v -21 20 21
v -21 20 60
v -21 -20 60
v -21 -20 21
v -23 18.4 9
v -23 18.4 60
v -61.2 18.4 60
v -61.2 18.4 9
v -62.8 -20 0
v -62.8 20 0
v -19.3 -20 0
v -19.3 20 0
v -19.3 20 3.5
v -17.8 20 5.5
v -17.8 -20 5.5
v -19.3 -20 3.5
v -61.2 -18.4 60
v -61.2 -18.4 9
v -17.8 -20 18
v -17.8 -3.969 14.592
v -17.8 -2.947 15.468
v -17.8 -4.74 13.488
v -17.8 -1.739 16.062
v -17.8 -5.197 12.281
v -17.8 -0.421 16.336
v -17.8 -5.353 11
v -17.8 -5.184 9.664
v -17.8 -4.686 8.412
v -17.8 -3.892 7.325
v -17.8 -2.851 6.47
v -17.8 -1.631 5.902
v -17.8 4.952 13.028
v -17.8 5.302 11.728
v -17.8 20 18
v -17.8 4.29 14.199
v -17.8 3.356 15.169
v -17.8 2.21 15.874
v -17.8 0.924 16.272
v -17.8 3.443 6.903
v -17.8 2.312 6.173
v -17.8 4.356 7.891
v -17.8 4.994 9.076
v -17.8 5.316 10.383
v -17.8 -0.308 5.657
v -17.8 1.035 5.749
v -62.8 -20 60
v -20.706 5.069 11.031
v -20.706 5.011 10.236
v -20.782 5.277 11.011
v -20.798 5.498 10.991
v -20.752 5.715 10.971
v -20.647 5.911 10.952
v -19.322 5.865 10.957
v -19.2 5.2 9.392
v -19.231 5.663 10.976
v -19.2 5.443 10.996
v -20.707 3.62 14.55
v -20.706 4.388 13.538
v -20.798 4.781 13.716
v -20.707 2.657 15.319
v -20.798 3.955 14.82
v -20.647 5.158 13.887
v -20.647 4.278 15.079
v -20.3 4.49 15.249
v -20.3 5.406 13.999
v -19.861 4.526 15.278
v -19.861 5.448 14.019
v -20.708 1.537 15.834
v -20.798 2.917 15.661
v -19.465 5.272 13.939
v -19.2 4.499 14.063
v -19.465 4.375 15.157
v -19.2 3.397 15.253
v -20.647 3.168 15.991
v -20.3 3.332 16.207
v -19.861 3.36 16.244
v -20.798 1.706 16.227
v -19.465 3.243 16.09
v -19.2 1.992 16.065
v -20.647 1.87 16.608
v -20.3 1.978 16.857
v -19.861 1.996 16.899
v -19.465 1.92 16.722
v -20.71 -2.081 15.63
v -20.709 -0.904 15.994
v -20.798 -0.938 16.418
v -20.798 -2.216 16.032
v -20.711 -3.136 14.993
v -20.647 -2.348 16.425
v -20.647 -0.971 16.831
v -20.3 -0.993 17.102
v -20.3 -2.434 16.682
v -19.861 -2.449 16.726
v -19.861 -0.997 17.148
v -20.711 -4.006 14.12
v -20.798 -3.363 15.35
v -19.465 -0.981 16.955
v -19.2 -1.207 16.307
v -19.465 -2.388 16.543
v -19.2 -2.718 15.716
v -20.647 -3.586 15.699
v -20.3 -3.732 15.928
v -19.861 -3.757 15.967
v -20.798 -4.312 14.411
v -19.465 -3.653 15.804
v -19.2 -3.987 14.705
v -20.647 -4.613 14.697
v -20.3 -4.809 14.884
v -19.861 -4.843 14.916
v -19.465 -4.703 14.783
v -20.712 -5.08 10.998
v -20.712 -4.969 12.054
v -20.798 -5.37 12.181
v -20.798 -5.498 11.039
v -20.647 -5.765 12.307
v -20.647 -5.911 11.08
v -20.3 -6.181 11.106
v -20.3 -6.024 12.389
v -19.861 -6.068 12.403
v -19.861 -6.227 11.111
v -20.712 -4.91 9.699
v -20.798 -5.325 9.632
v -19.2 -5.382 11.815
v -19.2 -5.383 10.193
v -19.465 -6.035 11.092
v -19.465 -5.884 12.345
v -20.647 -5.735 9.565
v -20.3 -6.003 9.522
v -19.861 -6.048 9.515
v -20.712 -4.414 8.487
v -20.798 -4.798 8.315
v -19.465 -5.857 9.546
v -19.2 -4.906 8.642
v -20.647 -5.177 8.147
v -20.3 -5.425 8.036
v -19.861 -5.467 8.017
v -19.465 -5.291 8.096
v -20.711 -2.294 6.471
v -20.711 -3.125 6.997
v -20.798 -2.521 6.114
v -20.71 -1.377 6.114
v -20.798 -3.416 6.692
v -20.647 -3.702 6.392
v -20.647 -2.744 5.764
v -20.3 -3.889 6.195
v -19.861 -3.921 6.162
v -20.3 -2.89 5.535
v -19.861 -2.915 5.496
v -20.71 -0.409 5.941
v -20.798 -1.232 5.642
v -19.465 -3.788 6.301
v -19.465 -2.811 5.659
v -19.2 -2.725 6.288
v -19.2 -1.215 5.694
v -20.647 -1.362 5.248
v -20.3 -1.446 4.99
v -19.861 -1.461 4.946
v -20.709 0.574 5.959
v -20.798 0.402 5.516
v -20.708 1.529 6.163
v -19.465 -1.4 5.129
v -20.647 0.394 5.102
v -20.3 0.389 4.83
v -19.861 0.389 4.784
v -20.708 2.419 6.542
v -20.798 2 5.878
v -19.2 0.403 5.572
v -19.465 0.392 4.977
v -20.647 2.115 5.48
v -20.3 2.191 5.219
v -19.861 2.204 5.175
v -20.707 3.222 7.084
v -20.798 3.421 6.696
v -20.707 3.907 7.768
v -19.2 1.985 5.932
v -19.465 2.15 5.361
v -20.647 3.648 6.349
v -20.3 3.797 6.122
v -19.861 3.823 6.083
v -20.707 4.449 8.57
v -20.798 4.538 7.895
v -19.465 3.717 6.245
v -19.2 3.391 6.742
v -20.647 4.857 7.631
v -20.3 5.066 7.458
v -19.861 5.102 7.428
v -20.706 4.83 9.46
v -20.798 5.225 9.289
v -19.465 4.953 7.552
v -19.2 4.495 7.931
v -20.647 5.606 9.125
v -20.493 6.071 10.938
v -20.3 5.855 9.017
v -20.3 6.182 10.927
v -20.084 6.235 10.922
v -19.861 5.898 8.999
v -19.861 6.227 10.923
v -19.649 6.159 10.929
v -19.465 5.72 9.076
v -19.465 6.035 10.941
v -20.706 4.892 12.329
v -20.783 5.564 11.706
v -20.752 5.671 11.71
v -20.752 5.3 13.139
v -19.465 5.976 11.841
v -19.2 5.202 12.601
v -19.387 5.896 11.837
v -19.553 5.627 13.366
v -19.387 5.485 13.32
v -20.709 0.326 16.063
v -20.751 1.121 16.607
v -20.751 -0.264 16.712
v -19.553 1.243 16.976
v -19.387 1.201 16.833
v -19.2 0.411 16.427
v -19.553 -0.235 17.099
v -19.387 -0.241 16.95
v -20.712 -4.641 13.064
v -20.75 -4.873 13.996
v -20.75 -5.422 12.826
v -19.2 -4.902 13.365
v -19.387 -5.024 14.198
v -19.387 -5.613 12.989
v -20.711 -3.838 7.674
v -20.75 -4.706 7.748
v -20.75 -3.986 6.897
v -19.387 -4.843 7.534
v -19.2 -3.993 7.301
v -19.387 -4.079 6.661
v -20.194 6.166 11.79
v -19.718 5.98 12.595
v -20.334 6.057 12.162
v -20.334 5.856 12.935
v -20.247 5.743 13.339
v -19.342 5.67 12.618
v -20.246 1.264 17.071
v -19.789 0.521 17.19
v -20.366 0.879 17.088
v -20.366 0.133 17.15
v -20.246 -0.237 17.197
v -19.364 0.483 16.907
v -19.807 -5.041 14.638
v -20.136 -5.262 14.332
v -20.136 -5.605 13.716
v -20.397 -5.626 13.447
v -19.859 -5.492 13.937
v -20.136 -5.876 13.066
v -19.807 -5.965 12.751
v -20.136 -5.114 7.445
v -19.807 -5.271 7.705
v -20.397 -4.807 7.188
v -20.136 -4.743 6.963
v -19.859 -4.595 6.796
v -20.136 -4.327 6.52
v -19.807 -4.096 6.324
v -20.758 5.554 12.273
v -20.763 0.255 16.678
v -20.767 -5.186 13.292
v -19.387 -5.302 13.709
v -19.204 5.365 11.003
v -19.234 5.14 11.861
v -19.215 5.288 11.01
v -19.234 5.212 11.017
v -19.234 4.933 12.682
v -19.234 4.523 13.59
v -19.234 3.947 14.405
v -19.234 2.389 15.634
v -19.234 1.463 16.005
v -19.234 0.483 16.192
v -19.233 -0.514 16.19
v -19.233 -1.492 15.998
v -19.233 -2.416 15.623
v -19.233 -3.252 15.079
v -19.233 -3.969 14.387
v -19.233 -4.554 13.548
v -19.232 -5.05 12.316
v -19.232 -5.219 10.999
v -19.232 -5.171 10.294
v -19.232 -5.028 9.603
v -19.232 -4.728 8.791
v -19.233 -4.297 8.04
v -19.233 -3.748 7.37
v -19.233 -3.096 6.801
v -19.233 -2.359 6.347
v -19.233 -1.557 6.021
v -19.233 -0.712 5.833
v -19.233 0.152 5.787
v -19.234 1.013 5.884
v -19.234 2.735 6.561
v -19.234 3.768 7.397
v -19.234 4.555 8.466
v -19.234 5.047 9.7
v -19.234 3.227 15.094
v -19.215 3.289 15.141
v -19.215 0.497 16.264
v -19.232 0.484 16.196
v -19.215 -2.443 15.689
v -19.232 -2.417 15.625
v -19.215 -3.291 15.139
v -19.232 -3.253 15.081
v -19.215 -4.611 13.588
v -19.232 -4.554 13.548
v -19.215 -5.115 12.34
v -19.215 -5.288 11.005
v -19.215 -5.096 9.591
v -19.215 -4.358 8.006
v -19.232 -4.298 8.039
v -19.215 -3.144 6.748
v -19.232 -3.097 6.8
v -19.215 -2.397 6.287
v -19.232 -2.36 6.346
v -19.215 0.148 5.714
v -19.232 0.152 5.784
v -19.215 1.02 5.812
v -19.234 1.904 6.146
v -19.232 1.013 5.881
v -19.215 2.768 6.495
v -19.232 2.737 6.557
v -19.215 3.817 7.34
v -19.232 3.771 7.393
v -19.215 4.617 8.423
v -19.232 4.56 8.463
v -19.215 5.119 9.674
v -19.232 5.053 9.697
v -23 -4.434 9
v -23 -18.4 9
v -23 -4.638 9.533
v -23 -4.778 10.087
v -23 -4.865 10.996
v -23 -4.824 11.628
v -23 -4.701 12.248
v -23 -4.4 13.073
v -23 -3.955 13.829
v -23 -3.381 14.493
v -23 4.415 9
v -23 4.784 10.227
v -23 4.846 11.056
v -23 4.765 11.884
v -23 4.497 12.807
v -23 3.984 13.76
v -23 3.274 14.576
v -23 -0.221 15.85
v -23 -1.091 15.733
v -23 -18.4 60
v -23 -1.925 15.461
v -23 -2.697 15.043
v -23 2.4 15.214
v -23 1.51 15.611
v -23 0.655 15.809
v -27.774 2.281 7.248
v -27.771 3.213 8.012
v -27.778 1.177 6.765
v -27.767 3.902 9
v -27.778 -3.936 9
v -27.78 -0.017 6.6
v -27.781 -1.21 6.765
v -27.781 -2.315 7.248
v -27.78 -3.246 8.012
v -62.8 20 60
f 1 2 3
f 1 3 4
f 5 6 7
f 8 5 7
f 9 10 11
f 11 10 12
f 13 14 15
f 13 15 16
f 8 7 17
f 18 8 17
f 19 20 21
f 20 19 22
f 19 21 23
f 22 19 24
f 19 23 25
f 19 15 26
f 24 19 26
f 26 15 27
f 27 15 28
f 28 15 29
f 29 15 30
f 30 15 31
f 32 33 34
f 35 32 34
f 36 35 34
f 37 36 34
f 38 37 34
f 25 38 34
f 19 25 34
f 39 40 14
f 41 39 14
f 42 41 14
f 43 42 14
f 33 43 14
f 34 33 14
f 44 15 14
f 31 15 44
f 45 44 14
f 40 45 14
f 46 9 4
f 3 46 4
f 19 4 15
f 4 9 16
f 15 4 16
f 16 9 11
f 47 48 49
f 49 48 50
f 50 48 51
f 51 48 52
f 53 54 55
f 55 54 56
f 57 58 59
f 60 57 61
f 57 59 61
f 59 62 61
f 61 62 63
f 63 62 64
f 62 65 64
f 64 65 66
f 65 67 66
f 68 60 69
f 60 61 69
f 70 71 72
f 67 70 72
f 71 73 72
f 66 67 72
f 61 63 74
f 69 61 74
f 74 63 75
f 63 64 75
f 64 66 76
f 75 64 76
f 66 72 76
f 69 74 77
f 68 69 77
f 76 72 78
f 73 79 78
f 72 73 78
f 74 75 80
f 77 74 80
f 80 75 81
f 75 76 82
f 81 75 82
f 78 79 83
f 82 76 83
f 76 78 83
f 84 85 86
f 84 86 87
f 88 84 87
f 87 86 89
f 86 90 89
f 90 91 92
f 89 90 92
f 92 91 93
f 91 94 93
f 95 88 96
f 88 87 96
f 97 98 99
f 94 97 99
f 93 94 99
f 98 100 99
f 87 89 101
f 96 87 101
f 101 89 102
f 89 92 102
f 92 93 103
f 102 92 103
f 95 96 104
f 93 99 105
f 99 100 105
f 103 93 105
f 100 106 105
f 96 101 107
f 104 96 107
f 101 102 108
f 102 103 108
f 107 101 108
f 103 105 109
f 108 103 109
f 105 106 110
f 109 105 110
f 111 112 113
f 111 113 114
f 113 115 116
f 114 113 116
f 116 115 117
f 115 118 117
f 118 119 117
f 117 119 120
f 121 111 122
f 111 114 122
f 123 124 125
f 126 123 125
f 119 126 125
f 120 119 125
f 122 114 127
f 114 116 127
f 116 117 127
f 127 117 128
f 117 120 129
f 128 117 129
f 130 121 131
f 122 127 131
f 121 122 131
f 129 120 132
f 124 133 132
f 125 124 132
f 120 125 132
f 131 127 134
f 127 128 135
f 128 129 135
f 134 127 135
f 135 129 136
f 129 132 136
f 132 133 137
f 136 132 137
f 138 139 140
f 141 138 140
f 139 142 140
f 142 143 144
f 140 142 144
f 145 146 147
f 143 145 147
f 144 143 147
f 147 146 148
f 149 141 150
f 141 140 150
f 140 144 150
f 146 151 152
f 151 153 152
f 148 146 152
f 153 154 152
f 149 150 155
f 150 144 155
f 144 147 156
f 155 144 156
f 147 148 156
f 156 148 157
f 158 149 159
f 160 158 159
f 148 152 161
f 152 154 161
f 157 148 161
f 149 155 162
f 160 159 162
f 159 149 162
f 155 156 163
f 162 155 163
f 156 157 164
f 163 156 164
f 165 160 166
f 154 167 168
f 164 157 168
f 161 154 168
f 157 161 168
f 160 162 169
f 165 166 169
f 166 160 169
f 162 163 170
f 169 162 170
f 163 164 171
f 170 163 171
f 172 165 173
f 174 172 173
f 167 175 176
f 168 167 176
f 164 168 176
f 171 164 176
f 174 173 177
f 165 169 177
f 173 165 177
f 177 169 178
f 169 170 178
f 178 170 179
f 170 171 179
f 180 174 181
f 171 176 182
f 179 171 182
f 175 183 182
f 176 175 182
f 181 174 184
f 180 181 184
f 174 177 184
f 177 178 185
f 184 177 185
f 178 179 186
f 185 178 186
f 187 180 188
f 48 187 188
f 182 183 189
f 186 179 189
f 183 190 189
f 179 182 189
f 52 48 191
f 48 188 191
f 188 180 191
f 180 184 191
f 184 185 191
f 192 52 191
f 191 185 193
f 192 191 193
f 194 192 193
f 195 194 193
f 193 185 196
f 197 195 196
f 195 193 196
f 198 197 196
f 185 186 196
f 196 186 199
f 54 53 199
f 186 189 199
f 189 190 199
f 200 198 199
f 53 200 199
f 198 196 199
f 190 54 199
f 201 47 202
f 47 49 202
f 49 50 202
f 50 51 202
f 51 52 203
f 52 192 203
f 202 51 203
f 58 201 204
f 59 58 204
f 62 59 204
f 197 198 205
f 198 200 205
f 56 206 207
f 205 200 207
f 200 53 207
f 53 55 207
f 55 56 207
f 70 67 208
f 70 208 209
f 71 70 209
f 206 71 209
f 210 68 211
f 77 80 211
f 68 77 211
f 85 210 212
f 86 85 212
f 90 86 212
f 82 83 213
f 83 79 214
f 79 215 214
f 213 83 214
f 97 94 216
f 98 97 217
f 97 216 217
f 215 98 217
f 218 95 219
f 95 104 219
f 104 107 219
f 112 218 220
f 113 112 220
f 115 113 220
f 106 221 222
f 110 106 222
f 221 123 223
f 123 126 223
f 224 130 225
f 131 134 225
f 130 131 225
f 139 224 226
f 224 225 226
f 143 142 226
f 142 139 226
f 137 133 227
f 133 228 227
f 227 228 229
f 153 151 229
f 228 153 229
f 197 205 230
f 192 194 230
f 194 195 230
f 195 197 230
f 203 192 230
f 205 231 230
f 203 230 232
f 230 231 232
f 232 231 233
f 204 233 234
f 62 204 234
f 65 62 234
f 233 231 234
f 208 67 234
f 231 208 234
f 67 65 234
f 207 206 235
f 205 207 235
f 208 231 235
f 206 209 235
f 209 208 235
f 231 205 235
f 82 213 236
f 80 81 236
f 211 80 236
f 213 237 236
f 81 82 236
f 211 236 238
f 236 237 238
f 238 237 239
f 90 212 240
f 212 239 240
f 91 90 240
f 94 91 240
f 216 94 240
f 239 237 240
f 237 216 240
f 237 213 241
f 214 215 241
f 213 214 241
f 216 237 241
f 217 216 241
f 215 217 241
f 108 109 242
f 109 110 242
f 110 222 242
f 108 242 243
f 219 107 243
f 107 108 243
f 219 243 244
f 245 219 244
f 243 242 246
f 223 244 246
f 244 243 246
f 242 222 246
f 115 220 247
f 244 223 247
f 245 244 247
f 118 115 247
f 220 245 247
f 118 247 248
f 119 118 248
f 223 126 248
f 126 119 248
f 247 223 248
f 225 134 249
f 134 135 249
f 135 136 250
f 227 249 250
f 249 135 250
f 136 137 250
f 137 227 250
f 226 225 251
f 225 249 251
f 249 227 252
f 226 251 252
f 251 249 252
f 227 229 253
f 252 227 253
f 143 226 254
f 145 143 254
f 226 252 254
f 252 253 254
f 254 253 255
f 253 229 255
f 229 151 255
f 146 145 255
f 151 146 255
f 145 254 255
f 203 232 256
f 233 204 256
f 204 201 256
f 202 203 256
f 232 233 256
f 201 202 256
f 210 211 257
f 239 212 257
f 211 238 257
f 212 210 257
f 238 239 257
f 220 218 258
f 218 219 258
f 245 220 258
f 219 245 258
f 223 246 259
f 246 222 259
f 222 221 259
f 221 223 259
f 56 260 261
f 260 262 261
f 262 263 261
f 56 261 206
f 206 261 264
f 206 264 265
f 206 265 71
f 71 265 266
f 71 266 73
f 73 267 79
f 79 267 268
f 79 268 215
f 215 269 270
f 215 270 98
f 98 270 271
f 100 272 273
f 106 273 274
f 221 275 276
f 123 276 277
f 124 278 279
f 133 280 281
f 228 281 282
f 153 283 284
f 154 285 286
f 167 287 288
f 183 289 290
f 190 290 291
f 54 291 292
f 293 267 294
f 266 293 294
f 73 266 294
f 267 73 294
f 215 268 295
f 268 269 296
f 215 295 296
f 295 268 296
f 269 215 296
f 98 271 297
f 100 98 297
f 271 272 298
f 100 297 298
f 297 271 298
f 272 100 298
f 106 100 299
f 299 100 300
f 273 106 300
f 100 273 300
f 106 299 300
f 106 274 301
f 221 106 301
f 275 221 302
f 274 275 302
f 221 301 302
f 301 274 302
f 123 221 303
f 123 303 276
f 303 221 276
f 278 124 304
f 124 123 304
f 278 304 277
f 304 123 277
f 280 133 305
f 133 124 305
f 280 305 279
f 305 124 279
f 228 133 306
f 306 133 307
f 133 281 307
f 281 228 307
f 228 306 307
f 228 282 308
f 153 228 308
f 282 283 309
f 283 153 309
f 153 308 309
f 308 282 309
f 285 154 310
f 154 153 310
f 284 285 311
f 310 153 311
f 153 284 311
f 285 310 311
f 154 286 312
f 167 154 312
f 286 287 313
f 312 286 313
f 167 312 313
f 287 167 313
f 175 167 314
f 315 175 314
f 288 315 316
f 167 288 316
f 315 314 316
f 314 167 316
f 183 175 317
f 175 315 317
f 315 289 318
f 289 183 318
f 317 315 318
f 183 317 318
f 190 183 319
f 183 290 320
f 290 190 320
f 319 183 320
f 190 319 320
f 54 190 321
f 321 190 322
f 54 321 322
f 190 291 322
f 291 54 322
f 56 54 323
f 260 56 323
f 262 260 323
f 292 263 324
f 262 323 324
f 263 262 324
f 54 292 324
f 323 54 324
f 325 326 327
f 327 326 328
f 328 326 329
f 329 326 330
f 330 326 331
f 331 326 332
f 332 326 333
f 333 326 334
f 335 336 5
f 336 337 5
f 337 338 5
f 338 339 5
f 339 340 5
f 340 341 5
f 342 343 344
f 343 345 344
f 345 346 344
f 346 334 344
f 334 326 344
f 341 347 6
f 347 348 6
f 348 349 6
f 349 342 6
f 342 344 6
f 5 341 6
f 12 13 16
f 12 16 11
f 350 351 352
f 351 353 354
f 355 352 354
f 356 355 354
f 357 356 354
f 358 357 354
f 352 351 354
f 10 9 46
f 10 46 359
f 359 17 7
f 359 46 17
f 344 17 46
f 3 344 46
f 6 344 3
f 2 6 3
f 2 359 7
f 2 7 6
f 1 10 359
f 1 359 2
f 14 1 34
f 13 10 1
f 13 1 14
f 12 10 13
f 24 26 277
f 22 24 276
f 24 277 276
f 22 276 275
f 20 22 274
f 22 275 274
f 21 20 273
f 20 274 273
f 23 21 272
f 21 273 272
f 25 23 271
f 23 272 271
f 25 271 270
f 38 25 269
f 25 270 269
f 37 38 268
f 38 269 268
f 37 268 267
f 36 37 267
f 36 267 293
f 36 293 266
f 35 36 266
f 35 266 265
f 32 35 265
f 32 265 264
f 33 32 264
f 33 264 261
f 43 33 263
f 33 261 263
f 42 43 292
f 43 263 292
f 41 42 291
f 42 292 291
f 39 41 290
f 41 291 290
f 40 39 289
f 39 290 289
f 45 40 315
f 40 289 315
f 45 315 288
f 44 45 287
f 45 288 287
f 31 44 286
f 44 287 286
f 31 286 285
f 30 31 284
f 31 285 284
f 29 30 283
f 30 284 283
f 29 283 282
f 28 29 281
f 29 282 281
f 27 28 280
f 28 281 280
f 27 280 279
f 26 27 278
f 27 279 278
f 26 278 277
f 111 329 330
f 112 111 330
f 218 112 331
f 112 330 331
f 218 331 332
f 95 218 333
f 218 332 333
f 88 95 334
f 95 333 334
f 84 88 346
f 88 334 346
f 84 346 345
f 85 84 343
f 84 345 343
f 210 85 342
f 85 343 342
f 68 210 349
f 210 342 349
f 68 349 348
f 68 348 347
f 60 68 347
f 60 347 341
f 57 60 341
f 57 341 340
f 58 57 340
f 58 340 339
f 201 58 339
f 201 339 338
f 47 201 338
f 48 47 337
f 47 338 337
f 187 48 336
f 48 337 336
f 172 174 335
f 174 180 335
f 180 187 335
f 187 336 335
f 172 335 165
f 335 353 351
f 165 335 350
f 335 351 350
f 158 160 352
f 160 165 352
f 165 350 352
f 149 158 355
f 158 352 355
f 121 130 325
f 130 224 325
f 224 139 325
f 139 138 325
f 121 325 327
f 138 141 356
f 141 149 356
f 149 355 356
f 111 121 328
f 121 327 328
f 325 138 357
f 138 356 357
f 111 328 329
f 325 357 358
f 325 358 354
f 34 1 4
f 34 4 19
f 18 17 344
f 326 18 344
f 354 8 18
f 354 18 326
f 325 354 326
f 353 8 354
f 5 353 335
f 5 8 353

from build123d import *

# Parameters (mm, degrees)
SKETCH010_W  = 45
SKETCH010_H  = 40
PAD005_DEPTH = 60
SKETCH012_W  = 38.2
SKETCH012_H  = 36.8
SKETCH003_R  = 5.4
SKETCH011_R  = 4.4
SKETCH046_R  = 0.8


with BuildPart() as part:
    # Sketch010 → Pad005 (new body)
    with BuildSketch(Plane.XY):
        with Locations((-40.3, 0)):
            Rectangle(SKETCH010_W, SKETCH010_H)
    extrude(amount=PAD005_DEPTH)

    # SubtractivePipe002: sweep along a path in Sketch028
    with BuildLine(Plane.XZ) as subtractivepipe002_path:
        Line((-39, 9), (-39, 60))
    # Sketch012 → SubtractivePipe002 (sweep, cut)
    with BuildSketch(Plane.XY.offset(9)):
        with Locations((-42.1, 0)):
            Rectangle(SKETCH012_W, SKETCH012_H)
    sweep(path=subtractivepipe002_path.line, mode=Mode.SUBTRACT)

    # Sketch003 (on Face10 of SubtractivePipe) → SubtractiveLoft section 0
    with BuildSketch(Plane(origin=(-17.3, 0, 0), x_dir=(0, -1, 0), z_dir=(-1, 0, 0))):
        with Locations((0, 11)):
            Circle(SKETCH003_R)
    # Sketch011 → SubtractiveLoft section 1
    with BuildSketch(Plane(origin=(-27.8, 0, 0), x_dir=(-0.001529, -0.999998, -0.001524), z_dir=(-0.999994, 0.001524, 0.003058))):
        with Locations((0, 11)):
            Circle(SKETCH011_R)
    loft(mode=Mode.SUBTRACT)

    # SubtractivePipe003: sweep along a path in Sketch034
    with BuildLine(Plane.YZ.offset(-17.8)) as subtractivepipe003_path:
        Line((-20, 4), (20, 4))
    # Sketch033 → SubtractivePipe003 (sweep, cut)
    with BuildSketch(Plane.XZ.offset(20)):
        Polygon((-17.8, 0), (-19.3, 0), (-19.3, 3.5), (-17.8, 5.5), align=None)
    sweep(path=subtractivepipe003_path.line, mode=Mode.SUBTRACT)

    # SubtractivePipe004: sweep along a path in Sketch037
    with BuildLine(Plane.YZ.offset(-17.8)) as subtractivepipe004_path:
        Line((-20, 36), (20, 36))
    # Sketch036 → SubtractivePipe004 (sweep, cut)
    with BuildSketch(Plane.XZ.offset(20)):
        Polygon((-21, 60), (-21, 21), (-17.8, 18), (-17.8, 60), align=None)
    sweep(path=subtractivepipe004_path.line, mode=Mode.SUBTRACT)

    # SubtractivePipe007: sweep along a path in Sketch045
    with BuildLine(Plane.YZ.offset(-17.8)) as subtractivepipe007_path:
        CenterArc((0, 11), 5.4, 0, 360)
    # Sketch046 → SubtractivePipe007 (sweep, cut)
    with BuildSketch(Plane(origin=(0, -2.3, 10.5), x_dir=(1, 0, 0), z_dir=(0, 0, 1))):
        with Locations((-20, -3.12)):
            Circle(SKETCH046_R)
    sweep(path=subtractivepipe007_path.line, mode=Mode.SUBTRACT)


solid = part.part
